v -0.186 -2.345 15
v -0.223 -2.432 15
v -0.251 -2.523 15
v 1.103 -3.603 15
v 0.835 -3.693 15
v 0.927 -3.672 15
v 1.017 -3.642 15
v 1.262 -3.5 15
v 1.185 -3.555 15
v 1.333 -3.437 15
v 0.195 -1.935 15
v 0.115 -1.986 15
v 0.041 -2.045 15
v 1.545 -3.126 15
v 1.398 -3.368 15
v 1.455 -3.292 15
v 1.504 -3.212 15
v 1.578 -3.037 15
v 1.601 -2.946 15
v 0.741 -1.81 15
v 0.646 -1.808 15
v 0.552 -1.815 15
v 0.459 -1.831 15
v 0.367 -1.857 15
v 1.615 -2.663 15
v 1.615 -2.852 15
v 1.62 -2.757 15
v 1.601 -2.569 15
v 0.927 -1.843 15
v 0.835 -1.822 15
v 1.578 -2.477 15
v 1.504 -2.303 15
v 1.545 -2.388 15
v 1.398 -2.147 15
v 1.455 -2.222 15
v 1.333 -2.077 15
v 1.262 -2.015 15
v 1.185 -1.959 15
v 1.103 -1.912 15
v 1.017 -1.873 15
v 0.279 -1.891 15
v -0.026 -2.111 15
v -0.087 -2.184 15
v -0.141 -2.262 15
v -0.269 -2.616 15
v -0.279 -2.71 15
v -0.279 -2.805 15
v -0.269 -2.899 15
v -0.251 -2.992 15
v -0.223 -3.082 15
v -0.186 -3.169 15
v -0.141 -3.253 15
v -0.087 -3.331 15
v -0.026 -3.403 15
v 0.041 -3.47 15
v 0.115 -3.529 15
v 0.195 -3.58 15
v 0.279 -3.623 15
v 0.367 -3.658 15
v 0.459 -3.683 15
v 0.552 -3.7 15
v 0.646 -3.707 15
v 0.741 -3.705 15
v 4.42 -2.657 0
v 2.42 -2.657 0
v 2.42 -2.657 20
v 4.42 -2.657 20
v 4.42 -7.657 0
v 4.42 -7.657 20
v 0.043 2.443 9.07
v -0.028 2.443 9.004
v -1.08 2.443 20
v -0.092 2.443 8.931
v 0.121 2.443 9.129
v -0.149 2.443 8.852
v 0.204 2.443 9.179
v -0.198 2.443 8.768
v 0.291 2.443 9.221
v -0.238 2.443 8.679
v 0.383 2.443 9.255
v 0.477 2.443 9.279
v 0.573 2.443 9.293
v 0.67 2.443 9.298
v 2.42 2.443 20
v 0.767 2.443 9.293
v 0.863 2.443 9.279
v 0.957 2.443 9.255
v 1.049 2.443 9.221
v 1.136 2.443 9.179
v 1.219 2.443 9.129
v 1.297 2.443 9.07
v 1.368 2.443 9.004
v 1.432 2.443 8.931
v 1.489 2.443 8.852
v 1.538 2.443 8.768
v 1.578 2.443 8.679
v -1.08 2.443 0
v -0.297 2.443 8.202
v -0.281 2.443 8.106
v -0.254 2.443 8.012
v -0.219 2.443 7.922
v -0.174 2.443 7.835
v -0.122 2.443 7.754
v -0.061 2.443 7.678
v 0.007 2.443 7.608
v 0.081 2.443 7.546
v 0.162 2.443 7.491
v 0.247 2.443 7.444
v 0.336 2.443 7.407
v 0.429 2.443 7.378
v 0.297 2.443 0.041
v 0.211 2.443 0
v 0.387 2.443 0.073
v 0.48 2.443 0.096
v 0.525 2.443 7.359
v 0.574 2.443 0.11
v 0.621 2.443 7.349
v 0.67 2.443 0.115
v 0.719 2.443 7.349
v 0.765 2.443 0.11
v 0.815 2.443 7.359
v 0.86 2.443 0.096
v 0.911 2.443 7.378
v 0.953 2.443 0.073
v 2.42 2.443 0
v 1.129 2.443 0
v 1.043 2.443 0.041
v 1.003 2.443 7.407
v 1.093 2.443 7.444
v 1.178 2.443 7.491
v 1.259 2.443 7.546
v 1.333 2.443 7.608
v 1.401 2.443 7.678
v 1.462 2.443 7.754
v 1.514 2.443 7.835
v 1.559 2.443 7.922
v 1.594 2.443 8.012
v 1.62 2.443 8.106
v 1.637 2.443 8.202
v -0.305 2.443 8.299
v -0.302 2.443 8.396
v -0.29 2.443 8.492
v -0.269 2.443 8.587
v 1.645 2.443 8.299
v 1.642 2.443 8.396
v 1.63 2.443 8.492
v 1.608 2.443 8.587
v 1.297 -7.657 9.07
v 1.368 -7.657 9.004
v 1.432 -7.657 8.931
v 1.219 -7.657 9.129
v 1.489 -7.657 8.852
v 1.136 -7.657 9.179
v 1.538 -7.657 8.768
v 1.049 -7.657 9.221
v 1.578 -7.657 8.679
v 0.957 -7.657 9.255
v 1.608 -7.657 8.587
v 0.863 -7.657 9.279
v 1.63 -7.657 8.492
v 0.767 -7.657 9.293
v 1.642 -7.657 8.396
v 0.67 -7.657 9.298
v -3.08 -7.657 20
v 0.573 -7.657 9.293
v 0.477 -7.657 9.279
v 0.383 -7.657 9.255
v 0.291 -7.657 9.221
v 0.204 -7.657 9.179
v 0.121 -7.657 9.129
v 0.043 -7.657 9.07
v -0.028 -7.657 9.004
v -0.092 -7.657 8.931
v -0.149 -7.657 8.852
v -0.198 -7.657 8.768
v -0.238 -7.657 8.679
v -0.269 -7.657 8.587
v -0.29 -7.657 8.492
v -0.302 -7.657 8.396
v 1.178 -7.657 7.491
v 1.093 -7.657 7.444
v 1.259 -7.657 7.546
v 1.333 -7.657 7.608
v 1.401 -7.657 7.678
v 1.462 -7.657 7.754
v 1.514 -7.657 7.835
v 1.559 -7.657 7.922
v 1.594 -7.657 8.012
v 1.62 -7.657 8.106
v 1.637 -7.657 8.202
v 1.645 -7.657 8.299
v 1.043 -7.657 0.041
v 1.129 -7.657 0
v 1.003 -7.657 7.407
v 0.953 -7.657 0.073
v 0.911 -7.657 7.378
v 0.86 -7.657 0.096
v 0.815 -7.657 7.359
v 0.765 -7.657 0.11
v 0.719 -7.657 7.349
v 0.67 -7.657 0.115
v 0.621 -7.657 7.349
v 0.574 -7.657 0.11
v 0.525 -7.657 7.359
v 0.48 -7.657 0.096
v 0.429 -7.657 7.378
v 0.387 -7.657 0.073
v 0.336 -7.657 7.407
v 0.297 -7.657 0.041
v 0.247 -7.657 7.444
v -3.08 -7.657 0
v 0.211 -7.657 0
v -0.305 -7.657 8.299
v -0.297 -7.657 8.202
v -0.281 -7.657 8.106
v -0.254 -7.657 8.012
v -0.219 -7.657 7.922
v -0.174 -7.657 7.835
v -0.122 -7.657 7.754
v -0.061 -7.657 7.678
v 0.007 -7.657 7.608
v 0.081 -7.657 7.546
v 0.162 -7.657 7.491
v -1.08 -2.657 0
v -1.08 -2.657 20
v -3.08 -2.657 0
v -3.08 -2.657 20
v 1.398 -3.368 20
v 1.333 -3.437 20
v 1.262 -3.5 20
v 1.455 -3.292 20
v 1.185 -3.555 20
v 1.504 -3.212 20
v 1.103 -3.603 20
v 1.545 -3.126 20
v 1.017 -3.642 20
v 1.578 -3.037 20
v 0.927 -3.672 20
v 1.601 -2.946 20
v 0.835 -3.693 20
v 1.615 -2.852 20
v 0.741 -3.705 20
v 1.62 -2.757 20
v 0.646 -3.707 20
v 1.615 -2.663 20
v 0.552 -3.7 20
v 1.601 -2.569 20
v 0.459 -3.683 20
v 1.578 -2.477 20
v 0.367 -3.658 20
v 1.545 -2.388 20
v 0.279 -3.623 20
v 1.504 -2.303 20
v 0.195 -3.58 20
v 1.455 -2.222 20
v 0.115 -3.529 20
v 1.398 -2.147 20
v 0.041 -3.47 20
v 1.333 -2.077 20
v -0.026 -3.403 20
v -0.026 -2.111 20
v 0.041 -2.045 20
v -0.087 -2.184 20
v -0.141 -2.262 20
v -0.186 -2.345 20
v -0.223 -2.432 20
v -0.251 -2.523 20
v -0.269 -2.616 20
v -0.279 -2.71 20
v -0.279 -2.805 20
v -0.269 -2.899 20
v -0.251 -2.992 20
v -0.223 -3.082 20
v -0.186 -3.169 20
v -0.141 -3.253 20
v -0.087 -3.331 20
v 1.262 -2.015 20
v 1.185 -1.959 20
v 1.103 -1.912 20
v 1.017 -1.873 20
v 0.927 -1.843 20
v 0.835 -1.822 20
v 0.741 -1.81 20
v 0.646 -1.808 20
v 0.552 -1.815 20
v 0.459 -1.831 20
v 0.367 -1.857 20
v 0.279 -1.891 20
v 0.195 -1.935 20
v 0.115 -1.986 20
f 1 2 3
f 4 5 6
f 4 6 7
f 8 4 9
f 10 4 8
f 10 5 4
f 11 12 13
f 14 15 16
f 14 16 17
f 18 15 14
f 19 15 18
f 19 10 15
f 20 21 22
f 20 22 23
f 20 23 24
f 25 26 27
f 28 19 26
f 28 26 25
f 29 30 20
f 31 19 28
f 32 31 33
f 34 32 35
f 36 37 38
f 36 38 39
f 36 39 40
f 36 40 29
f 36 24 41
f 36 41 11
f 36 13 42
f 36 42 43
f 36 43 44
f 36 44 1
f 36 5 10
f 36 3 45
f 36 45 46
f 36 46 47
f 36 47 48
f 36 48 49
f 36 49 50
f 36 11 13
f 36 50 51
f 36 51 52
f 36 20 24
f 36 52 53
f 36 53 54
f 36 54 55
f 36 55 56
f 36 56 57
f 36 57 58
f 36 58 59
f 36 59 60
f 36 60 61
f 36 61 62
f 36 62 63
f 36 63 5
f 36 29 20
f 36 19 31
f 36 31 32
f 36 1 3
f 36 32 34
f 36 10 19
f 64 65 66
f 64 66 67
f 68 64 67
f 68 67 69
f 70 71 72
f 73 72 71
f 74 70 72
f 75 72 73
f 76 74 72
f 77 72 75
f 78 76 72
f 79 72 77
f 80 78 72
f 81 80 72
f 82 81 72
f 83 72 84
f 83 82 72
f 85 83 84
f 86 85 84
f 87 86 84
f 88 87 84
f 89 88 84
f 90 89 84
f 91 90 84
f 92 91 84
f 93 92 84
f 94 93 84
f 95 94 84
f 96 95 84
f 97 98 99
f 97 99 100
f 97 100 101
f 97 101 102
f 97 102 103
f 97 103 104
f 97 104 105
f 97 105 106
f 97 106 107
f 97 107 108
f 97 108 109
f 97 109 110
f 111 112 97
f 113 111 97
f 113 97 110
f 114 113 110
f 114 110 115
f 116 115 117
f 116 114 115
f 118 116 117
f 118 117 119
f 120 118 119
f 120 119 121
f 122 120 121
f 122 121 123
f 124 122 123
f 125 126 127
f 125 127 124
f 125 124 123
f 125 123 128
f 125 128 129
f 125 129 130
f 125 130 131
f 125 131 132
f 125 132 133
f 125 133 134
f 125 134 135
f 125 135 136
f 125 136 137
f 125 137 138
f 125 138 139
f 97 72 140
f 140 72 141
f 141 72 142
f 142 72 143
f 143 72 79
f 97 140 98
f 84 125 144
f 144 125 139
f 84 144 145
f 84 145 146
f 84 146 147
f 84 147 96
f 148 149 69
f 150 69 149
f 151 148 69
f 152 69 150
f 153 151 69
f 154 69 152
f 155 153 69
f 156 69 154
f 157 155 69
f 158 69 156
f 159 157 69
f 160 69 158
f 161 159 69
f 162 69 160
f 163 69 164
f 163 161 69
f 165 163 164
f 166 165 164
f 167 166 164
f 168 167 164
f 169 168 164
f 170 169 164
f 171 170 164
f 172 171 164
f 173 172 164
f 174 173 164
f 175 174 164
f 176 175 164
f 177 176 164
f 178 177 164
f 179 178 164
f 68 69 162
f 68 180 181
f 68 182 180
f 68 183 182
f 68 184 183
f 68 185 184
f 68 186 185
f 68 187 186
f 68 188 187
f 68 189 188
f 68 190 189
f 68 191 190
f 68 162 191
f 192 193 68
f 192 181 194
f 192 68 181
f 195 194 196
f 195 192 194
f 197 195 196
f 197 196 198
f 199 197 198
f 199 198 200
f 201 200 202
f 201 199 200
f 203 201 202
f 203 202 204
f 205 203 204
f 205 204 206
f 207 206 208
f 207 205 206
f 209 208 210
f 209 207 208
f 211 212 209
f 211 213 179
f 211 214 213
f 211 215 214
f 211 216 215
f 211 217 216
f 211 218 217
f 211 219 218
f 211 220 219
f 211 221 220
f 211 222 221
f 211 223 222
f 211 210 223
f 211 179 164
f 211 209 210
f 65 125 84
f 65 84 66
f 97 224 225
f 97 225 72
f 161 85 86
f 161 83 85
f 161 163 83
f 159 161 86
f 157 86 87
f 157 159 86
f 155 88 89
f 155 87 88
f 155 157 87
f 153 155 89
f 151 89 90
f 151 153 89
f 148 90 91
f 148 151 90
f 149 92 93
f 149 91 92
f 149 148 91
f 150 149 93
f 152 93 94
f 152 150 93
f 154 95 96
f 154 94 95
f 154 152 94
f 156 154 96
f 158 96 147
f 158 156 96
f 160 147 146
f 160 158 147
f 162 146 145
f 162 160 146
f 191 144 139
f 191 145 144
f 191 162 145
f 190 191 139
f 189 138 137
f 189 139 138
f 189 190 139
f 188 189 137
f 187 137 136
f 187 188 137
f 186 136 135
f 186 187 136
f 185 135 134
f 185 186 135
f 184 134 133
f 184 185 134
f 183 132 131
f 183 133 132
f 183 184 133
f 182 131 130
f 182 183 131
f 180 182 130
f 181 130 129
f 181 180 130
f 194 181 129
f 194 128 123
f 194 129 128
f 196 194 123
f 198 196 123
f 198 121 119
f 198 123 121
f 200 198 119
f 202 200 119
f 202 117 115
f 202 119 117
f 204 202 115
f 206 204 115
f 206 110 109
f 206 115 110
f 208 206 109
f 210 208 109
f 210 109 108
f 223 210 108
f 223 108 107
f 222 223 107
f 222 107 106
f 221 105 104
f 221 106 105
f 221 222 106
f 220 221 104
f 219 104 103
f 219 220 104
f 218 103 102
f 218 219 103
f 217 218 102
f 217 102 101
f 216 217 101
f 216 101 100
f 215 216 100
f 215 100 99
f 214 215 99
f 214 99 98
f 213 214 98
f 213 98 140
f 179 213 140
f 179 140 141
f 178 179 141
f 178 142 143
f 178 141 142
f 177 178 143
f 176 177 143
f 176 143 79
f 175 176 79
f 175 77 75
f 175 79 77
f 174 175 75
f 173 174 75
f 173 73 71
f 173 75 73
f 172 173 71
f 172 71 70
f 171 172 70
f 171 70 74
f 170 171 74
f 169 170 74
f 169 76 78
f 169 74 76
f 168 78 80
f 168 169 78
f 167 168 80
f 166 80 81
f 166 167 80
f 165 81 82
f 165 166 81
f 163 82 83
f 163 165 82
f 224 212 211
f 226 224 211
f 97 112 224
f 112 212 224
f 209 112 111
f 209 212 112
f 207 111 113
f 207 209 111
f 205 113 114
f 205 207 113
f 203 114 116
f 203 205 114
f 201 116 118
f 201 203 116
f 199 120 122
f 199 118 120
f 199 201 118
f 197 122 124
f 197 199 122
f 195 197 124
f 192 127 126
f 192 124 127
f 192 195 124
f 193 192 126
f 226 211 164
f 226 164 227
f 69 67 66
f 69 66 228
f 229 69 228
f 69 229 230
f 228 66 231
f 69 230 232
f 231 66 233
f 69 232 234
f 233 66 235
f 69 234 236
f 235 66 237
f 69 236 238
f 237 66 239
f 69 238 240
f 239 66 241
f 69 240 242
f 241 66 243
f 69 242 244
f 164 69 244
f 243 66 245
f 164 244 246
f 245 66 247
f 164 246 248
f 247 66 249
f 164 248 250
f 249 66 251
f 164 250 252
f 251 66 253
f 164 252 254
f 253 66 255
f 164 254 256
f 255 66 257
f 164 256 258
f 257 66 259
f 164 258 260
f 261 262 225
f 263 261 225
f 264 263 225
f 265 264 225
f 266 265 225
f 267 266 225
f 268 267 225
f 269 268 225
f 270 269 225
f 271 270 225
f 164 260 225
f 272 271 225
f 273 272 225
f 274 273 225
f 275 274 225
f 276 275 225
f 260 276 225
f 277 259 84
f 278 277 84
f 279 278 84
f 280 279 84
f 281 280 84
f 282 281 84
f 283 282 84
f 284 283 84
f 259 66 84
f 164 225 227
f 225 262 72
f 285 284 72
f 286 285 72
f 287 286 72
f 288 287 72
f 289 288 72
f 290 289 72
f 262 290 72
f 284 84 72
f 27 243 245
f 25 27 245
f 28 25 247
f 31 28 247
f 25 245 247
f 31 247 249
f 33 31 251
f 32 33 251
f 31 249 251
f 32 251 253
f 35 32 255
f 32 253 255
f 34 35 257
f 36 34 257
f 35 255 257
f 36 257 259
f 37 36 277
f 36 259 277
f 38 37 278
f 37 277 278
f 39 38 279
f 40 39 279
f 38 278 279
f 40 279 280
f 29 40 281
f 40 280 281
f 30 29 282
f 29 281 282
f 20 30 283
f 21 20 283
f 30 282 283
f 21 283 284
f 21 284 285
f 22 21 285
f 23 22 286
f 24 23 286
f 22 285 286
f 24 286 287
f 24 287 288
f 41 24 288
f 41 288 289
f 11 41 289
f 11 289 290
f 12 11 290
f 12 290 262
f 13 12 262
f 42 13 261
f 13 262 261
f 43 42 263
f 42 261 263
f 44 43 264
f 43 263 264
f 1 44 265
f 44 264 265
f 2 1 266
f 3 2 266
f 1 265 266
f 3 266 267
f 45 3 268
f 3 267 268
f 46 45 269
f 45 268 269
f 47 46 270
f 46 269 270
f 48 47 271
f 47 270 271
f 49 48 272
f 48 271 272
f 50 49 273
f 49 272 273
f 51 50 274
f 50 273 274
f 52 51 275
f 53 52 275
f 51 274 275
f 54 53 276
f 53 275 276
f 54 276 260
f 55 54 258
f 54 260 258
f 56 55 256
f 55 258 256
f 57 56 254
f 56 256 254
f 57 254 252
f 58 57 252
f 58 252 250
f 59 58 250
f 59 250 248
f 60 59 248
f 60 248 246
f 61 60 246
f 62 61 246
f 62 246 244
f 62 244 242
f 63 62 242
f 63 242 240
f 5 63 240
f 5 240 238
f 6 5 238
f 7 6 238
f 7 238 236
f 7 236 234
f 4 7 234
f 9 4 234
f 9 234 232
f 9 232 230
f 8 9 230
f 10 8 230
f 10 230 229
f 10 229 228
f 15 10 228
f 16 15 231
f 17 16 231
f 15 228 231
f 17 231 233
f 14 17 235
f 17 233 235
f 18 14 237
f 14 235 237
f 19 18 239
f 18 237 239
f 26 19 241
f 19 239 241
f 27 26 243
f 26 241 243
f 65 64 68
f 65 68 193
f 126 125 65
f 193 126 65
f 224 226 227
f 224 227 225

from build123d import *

# Parameters (mm, degrees)
BOSS_EXTRUDE1_DEPTH     = 20
SKETCH3_R               = 0.95
CUT_EXTRUDE1_DEPTH      = 5
CUT_EXTRUDE2_DEPTH      = 23.837378659
CUT_EXTRUDE2_DEPTH_BACK = 23.837378659
SKETCH4_R               = 0.975


with BuildPart() as part:
    # Sketch2 → Boss-Extrude1 (new body)
    with BuildSketch(Plane.XY):
        Polygon((-1.080060634, 2.442708333), (2.419939366, 2.442708333), (2.419939366, -2.657291667), (4.419939366, -2.657291667), (4.419939366, -7.657291667), (-3.080060634, -7.657291667), (-3.080060634, -2.657291667), (-1.080060634, -2.657291667), align=None)
    extrude(amount=BOSS_EXTRUDE1_DEPTH)

    # Sketch3 → Cut-Extrude1 (cut)
    with BuildSketch(Plane.XY.offset(20)):
        with Locations((0.669939366, -2.757291667)):
            Circle(SKETCH3_R)
    extrude(amount=-CUT_EXTRUDE1_DEPTH, mode=Mode.SUBTRACT)

    # Sketch4 → Cut-Extrude2 (cut, two sides: drawn at the far end of the back side and taken through both)
    with BuildSketch(Plane(origin=(0, 2.442708333, 0), x_dir=(1, 0, 0), z_dir=(0, 1, 0)).offset(-CUT_EXTRUDE2_DEPTH_BACK)):
        with Locations((0.669939366, -8.322927776)):
            Circle(SKETCH4_R)
        with Locations((0.669939366, 0.86)):
            Circle(SKETCH4_R)
    extrude(amount=CUT_EXTRUDE2_DEPTH + CUT_EXTRUDE2_DEPTH_BACK, mode=Mode.SUBTRACT)


solid = part.part
